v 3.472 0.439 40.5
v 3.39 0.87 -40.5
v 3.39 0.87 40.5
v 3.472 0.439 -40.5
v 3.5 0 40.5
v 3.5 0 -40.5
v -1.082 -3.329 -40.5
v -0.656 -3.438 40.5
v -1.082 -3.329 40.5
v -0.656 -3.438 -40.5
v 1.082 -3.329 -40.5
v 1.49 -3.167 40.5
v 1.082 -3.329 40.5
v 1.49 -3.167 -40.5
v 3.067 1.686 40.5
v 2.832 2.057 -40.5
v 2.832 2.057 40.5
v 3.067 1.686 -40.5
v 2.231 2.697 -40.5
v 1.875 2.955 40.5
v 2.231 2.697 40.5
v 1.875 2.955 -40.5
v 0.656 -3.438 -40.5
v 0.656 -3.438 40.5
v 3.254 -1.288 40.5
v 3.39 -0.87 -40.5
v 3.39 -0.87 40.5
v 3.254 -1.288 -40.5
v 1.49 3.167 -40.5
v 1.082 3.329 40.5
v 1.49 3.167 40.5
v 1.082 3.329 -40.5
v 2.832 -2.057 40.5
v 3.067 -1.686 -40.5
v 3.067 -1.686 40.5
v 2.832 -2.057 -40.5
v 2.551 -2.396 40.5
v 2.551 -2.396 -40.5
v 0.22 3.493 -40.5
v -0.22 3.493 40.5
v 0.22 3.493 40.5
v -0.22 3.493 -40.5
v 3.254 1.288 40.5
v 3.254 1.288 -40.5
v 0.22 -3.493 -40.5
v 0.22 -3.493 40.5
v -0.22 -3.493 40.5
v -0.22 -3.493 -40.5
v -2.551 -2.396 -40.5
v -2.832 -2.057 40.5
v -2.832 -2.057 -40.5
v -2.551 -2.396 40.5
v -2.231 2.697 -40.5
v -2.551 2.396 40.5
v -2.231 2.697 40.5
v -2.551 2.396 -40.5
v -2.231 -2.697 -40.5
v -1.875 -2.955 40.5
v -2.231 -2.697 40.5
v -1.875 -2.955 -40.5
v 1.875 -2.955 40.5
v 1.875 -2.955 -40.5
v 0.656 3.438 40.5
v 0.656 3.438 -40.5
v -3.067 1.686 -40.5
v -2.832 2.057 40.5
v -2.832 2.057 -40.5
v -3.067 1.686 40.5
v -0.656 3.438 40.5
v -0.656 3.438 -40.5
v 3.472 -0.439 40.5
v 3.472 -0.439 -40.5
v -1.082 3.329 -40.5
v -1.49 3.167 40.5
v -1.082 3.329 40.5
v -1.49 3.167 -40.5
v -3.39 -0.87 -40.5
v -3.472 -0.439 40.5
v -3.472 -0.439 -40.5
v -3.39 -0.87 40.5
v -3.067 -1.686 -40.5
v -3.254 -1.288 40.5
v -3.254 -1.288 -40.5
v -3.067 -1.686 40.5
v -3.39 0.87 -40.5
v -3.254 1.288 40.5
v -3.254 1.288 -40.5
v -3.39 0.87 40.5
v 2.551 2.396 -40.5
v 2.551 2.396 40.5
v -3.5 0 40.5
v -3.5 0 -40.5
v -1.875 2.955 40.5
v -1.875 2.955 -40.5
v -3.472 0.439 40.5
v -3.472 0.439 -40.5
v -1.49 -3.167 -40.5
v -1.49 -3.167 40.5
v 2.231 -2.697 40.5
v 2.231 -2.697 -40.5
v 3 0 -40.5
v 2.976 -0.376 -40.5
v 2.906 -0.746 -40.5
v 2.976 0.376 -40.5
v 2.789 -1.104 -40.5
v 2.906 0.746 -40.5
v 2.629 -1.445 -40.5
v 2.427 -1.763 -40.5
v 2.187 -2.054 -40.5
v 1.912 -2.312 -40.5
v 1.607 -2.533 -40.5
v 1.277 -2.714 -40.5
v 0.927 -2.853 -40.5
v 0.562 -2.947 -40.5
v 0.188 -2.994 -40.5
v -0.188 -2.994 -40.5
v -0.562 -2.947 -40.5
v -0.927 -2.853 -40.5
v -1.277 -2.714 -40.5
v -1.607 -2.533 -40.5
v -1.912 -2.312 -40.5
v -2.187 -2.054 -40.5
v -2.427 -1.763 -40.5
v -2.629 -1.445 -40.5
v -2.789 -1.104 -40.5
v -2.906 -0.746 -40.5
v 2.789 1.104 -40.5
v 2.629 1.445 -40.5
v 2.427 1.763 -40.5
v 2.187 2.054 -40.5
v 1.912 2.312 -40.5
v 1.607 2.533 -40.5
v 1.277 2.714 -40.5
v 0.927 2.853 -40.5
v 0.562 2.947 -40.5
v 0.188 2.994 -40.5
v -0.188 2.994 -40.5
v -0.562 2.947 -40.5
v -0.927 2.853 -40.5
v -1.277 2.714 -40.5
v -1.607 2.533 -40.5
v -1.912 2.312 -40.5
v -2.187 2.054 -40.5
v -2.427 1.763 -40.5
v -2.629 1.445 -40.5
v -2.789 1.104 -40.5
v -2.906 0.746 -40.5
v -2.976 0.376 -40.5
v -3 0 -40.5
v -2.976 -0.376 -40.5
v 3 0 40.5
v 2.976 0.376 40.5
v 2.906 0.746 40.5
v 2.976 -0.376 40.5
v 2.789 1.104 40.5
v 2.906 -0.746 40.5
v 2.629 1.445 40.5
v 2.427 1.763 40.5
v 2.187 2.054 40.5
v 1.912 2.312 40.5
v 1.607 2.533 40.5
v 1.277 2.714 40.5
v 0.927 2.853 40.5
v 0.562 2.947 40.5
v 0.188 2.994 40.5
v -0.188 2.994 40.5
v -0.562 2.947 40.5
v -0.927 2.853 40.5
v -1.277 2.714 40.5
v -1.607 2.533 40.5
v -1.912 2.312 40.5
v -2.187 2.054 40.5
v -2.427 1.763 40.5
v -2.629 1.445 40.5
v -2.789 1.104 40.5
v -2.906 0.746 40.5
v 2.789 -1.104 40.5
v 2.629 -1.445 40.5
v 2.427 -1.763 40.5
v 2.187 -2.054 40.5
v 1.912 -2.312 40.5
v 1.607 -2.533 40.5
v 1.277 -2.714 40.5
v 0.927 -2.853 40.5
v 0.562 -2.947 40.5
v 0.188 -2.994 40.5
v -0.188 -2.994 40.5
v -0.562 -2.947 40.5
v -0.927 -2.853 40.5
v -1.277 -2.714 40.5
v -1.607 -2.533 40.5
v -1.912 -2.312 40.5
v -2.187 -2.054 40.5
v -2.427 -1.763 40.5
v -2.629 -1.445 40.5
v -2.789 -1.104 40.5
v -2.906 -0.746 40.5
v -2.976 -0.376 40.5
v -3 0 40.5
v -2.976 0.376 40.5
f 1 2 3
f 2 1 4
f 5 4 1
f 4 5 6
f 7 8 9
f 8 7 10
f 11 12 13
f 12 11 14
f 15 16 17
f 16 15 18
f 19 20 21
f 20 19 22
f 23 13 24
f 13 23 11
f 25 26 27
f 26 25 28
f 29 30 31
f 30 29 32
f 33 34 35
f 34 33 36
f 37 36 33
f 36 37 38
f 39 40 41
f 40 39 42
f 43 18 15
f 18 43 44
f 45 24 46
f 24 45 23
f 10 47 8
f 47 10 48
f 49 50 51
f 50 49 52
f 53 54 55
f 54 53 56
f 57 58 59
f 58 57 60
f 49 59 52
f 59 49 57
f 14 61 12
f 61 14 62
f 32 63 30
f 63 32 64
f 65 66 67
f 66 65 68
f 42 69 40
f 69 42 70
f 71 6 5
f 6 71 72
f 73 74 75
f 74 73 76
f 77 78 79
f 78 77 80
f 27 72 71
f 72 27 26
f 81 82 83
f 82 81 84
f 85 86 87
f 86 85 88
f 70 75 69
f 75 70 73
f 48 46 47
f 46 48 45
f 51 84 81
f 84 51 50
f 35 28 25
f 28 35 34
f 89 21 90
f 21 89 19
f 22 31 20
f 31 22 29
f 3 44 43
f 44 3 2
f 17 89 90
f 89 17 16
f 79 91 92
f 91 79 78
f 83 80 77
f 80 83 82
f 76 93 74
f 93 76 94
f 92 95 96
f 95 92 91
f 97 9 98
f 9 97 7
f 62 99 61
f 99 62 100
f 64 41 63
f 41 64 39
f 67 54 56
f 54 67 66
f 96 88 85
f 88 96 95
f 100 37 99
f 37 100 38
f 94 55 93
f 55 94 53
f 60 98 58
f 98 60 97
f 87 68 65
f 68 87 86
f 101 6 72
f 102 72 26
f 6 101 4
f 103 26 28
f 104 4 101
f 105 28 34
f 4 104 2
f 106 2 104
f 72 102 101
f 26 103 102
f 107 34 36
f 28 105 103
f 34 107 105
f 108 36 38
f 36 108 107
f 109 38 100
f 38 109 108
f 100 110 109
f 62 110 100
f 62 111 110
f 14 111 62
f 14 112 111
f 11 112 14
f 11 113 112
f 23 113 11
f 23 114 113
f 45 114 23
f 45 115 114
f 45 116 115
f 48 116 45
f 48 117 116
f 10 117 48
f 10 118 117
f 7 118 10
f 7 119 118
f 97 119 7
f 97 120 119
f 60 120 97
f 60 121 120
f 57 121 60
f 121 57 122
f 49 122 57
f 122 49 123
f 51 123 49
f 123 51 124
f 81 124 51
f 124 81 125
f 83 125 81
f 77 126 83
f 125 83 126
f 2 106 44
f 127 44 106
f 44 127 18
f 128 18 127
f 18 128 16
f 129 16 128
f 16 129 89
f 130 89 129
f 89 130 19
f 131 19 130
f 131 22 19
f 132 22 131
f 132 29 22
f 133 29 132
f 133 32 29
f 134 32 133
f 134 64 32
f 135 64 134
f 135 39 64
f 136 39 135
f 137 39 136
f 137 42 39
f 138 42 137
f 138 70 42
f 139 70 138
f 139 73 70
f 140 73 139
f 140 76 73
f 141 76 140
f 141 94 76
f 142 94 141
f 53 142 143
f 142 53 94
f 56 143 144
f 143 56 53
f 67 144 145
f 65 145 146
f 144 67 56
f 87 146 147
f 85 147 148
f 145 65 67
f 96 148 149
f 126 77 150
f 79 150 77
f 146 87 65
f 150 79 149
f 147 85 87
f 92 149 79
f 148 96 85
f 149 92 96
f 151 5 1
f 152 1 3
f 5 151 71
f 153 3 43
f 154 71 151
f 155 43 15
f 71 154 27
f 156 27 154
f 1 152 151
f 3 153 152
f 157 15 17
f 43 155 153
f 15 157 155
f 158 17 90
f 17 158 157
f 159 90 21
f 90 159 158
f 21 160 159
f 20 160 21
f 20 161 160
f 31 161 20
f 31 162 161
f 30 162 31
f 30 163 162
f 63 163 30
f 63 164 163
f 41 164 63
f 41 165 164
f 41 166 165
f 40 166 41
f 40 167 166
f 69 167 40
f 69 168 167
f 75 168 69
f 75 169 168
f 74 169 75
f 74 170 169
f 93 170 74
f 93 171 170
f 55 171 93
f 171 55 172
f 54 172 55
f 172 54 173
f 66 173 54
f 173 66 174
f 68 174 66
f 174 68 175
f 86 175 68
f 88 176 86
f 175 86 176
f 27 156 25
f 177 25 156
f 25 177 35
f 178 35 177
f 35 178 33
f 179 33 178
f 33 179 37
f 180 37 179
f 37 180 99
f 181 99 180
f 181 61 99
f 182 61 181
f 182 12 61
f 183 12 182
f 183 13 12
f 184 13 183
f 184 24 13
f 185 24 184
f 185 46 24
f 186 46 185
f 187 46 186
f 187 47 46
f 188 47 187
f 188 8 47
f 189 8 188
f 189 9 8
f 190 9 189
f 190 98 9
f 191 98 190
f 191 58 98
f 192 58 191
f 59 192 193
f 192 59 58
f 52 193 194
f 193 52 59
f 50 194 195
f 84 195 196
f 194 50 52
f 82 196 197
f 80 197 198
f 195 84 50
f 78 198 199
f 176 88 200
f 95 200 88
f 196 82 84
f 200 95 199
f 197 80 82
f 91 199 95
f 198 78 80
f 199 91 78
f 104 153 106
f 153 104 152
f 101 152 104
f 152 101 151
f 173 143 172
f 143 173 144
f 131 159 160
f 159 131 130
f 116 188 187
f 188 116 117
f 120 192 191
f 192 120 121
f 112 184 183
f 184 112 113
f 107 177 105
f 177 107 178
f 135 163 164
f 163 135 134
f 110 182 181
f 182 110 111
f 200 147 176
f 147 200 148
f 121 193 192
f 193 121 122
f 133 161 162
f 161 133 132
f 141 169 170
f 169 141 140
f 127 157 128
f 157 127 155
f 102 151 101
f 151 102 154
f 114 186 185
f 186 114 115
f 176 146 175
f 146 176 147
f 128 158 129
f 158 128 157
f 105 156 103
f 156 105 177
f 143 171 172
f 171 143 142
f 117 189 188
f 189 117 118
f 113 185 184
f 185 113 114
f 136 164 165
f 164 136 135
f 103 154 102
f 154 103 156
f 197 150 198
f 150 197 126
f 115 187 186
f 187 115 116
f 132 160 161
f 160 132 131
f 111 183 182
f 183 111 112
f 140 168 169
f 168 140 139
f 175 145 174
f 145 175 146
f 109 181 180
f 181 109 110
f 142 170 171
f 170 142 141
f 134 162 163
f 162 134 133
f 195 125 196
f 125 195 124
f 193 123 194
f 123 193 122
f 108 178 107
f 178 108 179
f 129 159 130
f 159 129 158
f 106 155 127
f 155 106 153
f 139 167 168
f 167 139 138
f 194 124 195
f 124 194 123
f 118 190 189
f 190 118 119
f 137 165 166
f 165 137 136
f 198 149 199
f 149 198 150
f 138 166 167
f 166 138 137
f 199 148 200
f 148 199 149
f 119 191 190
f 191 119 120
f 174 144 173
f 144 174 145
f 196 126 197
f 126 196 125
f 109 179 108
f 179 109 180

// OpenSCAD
$fn = 50;


difference() {
	union() {
		translate(v = [0, 0, -40.5000000000]) {
			cylinder(h = 81, r = 3.5000000000);
		}
	}
	union() {
		translate(v = [0, 0, -100.0000000000]) {
			cylinder(h = 200, r = 3.0000000000);
		}
	}
}
